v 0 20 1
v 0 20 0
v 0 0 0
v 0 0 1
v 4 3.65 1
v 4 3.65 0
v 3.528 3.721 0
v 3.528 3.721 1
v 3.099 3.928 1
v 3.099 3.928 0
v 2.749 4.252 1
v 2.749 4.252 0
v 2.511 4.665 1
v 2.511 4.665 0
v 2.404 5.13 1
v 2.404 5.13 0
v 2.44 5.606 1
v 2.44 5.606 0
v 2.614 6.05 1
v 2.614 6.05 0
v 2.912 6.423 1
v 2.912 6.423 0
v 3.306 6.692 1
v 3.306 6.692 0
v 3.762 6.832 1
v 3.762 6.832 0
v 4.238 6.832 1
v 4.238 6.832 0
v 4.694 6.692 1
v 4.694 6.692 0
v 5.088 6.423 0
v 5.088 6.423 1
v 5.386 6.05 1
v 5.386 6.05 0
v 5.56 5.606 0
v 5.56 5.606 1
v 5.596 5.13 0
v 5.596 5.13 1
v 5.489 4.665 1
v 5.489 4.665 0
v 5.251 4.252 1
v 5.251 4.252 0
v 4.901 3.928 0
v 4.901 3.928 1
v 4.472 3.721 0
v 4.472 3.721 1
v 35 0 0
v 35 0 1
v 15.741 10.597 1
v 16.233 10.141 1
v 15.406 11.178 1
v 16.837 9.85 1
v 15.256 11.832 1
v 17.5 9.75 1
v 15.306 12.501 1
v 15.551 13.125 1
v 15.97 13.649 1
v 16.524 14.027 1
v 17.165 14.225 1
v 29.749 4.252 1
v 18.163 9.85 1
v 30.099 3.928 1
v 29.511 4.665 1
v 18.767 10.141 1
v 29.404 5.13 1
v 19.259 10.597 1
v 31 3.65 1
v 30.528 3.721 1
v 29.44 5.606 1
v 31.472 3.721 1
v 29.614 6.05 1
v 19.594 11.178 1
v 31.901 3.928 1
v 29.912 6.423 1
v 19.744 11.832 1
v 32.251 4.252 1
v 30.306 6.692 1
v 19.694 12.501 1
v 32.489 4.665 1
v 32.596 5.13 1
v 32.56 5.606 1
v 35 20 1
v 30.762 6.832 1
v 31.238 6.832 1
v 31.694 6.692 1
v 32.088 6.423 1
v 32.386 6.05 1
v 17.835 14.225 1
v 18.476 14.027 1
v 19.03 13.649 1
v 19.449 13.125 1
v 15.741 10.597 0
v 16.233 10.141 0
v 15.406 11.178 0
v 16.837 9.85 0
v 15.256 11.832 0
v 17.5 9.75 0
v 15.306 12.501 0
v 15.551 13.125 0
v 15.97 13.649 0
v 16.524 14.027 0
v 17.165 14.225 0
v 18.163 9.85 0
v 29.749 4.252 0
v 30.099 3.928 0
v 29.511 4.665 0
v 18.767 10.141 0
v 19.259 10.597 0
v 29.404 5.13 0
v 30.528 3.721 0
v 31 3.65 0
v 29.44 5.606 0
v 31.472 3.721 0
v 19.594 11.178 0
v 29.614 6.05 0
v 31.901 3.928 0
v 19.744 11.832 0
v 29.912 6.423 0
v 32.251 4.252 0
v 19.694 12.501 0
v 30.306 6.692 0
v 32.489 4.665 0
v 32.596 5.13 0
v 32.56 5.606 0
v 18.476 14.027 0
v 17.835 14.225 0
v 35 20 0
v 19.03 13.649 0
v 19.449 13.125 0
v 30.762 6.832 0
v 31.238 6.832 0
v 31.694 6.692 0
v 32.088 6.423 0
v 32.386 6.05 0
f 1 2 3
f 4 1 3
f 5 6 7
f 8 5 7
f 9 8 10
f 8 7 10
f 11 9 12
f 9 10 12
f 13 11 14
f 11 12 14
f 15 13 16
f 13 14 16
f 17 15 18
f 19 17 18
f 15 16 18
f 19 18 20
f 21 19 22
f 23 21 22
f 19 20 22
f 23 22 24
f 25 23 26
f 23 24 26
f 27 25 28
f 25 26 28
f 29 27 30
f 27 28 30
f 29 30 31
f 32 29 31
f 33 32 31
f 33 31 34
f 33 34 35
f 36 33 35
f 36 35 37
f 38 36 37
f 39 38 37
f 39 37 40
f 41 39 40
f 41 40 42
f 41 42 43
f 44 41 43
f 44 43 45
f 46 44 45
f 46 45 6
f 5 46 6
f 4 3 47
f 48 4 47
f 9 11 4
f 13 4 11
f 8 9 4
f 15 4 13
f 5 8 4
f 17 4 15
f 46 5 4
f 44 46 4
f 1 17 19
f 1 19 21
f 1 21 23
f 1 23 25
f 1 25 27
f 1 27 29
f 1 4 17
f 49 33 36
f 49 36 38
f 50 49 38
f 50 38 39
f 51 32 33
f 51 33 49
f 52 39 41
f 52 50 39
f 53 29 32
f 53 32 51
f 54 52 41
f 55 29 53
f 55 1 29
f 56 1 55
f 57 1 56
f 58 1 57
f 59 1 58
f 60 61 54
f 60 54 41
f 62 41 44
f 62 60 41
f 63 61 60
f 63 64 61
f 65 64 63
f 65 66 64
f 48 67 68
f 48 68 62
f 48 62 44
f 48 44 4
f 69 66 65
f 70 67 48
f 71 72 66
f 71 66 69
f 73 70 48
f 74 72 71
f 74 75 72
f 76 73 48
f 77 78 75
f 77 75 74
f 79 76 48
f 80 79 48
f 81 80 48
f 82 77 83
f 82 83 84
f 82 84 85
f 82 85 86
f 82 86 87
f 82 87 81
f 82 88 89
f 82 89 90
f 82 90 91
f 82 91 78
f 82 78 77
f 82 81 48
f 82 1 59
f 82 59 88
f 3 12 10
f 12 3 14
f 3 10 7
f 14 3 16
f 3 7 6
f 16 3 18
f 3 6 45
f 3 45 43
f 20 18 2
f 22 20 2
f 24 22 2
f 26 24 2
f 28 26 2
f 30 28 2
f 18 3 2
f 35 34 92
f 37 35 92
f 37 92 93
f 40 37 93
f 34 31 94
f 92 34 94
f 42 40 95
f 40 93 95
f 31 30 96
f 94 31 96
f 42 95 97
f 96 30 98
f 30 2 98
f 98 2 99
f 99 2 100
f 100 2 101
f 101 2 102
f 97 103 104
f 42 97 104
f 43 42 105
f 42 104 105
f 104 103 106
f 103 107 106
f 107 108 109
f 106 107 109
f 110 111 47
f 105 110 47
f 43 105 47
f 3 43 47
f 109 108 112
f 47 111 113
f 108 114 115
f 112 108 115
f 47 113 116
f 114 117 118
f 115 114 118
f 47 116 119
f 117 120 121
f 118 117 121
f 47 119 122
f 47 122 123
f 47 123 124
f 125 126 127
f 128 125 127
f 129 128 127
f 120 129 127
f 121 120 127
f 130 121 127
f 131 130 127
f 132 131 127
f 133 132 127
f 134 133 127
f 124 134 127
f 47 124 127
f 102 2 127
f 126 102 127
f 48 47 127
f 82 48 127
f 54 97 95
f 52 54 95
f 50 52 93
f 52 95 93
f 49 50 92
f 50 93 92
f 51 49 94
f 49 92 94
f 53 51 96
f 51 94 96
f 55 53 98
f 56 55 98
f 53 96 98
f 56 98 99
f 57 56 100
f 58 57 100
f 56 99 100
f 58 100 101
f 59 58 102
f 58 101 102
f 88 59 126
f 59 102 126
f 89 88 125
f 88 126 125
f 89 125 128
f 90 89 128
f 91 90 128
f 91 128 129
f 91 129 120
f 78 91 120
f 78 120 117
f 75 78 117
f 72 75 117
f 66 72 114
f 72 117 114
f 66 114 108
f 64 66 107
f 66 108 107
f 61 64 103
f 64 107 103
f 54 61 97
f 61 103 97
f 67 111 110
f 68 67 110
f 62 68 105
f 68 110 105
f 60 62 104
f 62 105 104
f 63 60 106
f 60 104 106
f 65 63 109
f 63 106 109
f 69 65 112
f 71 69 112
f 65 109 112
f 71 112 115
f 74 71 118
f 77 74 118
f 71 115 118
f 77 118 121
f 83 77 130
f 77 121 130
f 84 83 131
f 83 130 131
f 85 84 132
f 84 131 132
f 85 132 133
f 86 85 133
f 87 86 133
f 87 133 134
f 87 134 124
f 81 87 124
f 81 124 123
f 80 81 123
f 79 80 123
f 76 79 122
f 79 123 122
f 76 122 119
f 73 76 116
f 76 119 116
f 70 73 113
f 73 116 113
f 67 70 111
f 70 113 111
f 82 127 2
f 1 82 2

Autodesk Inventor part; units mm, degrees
ref_plane "YZ Plane" through (0, 0, 0) normal (1, 0, 0) x (0, 1, 0)
ref_plane "XZ Plane" through (0, 0, 0) normal (0, 1, 0) x (-1, 0, 0)
ref_plane "XY Plane" through (0, 0, 0) normal (0, 0, 1) x (1, 0, 0)
sketch "スケッチ1" plane through (0, 0, 0) normal (0, 0, 1) x (1, 0, 0)
  line L0 (0, 0) -> (35, 0)
  line L1 (35, 0) -> (35, 20)
  line L2 (35, 20) -> (0, 20)
  line L3 (0, 20) -> (0, 0)
  dimension "d0" = 20
  dimension "d1" = 35
extrude "押し出し1" add sketch "スケッチ1" along normal blind 1
sketch "スケッチ2" plane through (0, 0, 1) normal (0, 0, 1) x (1, 0, 0)
  line L0 (35, 20) -> (0, 20) projected
  point P0 (0, 0)
  point P1 (17.5, 12)
  point P2 (17.5, 20)
  dimension "d4" = 8
hole "穴1" at (17.5, 12, 1) direction (0, 0, -1) diameter 4.5 end through all
sketch "スケッチ3" plane through (0, 0, 1) normal (0, 0, 1) x (1, 0, 0)
  line L0 (0, 20) -> (0, 0) projected
  line L1 (0, 0) -> (35, 0) projected
  line L2 (35, 20) -> (0, 20) projected
  point P0 (4, 5.25)
  point P1 (31, 5.25)
  dimension "d12" = 27
  dimension "d13" = 4
  dimension "d22" = 14.75
hole "穴2" at (4, 5.25, 1) at (31, 5.25, 1) direction (0, 0, -1) diameter 3.2 end through all
properties part number "CLS_typeC_31.4N_plate"
